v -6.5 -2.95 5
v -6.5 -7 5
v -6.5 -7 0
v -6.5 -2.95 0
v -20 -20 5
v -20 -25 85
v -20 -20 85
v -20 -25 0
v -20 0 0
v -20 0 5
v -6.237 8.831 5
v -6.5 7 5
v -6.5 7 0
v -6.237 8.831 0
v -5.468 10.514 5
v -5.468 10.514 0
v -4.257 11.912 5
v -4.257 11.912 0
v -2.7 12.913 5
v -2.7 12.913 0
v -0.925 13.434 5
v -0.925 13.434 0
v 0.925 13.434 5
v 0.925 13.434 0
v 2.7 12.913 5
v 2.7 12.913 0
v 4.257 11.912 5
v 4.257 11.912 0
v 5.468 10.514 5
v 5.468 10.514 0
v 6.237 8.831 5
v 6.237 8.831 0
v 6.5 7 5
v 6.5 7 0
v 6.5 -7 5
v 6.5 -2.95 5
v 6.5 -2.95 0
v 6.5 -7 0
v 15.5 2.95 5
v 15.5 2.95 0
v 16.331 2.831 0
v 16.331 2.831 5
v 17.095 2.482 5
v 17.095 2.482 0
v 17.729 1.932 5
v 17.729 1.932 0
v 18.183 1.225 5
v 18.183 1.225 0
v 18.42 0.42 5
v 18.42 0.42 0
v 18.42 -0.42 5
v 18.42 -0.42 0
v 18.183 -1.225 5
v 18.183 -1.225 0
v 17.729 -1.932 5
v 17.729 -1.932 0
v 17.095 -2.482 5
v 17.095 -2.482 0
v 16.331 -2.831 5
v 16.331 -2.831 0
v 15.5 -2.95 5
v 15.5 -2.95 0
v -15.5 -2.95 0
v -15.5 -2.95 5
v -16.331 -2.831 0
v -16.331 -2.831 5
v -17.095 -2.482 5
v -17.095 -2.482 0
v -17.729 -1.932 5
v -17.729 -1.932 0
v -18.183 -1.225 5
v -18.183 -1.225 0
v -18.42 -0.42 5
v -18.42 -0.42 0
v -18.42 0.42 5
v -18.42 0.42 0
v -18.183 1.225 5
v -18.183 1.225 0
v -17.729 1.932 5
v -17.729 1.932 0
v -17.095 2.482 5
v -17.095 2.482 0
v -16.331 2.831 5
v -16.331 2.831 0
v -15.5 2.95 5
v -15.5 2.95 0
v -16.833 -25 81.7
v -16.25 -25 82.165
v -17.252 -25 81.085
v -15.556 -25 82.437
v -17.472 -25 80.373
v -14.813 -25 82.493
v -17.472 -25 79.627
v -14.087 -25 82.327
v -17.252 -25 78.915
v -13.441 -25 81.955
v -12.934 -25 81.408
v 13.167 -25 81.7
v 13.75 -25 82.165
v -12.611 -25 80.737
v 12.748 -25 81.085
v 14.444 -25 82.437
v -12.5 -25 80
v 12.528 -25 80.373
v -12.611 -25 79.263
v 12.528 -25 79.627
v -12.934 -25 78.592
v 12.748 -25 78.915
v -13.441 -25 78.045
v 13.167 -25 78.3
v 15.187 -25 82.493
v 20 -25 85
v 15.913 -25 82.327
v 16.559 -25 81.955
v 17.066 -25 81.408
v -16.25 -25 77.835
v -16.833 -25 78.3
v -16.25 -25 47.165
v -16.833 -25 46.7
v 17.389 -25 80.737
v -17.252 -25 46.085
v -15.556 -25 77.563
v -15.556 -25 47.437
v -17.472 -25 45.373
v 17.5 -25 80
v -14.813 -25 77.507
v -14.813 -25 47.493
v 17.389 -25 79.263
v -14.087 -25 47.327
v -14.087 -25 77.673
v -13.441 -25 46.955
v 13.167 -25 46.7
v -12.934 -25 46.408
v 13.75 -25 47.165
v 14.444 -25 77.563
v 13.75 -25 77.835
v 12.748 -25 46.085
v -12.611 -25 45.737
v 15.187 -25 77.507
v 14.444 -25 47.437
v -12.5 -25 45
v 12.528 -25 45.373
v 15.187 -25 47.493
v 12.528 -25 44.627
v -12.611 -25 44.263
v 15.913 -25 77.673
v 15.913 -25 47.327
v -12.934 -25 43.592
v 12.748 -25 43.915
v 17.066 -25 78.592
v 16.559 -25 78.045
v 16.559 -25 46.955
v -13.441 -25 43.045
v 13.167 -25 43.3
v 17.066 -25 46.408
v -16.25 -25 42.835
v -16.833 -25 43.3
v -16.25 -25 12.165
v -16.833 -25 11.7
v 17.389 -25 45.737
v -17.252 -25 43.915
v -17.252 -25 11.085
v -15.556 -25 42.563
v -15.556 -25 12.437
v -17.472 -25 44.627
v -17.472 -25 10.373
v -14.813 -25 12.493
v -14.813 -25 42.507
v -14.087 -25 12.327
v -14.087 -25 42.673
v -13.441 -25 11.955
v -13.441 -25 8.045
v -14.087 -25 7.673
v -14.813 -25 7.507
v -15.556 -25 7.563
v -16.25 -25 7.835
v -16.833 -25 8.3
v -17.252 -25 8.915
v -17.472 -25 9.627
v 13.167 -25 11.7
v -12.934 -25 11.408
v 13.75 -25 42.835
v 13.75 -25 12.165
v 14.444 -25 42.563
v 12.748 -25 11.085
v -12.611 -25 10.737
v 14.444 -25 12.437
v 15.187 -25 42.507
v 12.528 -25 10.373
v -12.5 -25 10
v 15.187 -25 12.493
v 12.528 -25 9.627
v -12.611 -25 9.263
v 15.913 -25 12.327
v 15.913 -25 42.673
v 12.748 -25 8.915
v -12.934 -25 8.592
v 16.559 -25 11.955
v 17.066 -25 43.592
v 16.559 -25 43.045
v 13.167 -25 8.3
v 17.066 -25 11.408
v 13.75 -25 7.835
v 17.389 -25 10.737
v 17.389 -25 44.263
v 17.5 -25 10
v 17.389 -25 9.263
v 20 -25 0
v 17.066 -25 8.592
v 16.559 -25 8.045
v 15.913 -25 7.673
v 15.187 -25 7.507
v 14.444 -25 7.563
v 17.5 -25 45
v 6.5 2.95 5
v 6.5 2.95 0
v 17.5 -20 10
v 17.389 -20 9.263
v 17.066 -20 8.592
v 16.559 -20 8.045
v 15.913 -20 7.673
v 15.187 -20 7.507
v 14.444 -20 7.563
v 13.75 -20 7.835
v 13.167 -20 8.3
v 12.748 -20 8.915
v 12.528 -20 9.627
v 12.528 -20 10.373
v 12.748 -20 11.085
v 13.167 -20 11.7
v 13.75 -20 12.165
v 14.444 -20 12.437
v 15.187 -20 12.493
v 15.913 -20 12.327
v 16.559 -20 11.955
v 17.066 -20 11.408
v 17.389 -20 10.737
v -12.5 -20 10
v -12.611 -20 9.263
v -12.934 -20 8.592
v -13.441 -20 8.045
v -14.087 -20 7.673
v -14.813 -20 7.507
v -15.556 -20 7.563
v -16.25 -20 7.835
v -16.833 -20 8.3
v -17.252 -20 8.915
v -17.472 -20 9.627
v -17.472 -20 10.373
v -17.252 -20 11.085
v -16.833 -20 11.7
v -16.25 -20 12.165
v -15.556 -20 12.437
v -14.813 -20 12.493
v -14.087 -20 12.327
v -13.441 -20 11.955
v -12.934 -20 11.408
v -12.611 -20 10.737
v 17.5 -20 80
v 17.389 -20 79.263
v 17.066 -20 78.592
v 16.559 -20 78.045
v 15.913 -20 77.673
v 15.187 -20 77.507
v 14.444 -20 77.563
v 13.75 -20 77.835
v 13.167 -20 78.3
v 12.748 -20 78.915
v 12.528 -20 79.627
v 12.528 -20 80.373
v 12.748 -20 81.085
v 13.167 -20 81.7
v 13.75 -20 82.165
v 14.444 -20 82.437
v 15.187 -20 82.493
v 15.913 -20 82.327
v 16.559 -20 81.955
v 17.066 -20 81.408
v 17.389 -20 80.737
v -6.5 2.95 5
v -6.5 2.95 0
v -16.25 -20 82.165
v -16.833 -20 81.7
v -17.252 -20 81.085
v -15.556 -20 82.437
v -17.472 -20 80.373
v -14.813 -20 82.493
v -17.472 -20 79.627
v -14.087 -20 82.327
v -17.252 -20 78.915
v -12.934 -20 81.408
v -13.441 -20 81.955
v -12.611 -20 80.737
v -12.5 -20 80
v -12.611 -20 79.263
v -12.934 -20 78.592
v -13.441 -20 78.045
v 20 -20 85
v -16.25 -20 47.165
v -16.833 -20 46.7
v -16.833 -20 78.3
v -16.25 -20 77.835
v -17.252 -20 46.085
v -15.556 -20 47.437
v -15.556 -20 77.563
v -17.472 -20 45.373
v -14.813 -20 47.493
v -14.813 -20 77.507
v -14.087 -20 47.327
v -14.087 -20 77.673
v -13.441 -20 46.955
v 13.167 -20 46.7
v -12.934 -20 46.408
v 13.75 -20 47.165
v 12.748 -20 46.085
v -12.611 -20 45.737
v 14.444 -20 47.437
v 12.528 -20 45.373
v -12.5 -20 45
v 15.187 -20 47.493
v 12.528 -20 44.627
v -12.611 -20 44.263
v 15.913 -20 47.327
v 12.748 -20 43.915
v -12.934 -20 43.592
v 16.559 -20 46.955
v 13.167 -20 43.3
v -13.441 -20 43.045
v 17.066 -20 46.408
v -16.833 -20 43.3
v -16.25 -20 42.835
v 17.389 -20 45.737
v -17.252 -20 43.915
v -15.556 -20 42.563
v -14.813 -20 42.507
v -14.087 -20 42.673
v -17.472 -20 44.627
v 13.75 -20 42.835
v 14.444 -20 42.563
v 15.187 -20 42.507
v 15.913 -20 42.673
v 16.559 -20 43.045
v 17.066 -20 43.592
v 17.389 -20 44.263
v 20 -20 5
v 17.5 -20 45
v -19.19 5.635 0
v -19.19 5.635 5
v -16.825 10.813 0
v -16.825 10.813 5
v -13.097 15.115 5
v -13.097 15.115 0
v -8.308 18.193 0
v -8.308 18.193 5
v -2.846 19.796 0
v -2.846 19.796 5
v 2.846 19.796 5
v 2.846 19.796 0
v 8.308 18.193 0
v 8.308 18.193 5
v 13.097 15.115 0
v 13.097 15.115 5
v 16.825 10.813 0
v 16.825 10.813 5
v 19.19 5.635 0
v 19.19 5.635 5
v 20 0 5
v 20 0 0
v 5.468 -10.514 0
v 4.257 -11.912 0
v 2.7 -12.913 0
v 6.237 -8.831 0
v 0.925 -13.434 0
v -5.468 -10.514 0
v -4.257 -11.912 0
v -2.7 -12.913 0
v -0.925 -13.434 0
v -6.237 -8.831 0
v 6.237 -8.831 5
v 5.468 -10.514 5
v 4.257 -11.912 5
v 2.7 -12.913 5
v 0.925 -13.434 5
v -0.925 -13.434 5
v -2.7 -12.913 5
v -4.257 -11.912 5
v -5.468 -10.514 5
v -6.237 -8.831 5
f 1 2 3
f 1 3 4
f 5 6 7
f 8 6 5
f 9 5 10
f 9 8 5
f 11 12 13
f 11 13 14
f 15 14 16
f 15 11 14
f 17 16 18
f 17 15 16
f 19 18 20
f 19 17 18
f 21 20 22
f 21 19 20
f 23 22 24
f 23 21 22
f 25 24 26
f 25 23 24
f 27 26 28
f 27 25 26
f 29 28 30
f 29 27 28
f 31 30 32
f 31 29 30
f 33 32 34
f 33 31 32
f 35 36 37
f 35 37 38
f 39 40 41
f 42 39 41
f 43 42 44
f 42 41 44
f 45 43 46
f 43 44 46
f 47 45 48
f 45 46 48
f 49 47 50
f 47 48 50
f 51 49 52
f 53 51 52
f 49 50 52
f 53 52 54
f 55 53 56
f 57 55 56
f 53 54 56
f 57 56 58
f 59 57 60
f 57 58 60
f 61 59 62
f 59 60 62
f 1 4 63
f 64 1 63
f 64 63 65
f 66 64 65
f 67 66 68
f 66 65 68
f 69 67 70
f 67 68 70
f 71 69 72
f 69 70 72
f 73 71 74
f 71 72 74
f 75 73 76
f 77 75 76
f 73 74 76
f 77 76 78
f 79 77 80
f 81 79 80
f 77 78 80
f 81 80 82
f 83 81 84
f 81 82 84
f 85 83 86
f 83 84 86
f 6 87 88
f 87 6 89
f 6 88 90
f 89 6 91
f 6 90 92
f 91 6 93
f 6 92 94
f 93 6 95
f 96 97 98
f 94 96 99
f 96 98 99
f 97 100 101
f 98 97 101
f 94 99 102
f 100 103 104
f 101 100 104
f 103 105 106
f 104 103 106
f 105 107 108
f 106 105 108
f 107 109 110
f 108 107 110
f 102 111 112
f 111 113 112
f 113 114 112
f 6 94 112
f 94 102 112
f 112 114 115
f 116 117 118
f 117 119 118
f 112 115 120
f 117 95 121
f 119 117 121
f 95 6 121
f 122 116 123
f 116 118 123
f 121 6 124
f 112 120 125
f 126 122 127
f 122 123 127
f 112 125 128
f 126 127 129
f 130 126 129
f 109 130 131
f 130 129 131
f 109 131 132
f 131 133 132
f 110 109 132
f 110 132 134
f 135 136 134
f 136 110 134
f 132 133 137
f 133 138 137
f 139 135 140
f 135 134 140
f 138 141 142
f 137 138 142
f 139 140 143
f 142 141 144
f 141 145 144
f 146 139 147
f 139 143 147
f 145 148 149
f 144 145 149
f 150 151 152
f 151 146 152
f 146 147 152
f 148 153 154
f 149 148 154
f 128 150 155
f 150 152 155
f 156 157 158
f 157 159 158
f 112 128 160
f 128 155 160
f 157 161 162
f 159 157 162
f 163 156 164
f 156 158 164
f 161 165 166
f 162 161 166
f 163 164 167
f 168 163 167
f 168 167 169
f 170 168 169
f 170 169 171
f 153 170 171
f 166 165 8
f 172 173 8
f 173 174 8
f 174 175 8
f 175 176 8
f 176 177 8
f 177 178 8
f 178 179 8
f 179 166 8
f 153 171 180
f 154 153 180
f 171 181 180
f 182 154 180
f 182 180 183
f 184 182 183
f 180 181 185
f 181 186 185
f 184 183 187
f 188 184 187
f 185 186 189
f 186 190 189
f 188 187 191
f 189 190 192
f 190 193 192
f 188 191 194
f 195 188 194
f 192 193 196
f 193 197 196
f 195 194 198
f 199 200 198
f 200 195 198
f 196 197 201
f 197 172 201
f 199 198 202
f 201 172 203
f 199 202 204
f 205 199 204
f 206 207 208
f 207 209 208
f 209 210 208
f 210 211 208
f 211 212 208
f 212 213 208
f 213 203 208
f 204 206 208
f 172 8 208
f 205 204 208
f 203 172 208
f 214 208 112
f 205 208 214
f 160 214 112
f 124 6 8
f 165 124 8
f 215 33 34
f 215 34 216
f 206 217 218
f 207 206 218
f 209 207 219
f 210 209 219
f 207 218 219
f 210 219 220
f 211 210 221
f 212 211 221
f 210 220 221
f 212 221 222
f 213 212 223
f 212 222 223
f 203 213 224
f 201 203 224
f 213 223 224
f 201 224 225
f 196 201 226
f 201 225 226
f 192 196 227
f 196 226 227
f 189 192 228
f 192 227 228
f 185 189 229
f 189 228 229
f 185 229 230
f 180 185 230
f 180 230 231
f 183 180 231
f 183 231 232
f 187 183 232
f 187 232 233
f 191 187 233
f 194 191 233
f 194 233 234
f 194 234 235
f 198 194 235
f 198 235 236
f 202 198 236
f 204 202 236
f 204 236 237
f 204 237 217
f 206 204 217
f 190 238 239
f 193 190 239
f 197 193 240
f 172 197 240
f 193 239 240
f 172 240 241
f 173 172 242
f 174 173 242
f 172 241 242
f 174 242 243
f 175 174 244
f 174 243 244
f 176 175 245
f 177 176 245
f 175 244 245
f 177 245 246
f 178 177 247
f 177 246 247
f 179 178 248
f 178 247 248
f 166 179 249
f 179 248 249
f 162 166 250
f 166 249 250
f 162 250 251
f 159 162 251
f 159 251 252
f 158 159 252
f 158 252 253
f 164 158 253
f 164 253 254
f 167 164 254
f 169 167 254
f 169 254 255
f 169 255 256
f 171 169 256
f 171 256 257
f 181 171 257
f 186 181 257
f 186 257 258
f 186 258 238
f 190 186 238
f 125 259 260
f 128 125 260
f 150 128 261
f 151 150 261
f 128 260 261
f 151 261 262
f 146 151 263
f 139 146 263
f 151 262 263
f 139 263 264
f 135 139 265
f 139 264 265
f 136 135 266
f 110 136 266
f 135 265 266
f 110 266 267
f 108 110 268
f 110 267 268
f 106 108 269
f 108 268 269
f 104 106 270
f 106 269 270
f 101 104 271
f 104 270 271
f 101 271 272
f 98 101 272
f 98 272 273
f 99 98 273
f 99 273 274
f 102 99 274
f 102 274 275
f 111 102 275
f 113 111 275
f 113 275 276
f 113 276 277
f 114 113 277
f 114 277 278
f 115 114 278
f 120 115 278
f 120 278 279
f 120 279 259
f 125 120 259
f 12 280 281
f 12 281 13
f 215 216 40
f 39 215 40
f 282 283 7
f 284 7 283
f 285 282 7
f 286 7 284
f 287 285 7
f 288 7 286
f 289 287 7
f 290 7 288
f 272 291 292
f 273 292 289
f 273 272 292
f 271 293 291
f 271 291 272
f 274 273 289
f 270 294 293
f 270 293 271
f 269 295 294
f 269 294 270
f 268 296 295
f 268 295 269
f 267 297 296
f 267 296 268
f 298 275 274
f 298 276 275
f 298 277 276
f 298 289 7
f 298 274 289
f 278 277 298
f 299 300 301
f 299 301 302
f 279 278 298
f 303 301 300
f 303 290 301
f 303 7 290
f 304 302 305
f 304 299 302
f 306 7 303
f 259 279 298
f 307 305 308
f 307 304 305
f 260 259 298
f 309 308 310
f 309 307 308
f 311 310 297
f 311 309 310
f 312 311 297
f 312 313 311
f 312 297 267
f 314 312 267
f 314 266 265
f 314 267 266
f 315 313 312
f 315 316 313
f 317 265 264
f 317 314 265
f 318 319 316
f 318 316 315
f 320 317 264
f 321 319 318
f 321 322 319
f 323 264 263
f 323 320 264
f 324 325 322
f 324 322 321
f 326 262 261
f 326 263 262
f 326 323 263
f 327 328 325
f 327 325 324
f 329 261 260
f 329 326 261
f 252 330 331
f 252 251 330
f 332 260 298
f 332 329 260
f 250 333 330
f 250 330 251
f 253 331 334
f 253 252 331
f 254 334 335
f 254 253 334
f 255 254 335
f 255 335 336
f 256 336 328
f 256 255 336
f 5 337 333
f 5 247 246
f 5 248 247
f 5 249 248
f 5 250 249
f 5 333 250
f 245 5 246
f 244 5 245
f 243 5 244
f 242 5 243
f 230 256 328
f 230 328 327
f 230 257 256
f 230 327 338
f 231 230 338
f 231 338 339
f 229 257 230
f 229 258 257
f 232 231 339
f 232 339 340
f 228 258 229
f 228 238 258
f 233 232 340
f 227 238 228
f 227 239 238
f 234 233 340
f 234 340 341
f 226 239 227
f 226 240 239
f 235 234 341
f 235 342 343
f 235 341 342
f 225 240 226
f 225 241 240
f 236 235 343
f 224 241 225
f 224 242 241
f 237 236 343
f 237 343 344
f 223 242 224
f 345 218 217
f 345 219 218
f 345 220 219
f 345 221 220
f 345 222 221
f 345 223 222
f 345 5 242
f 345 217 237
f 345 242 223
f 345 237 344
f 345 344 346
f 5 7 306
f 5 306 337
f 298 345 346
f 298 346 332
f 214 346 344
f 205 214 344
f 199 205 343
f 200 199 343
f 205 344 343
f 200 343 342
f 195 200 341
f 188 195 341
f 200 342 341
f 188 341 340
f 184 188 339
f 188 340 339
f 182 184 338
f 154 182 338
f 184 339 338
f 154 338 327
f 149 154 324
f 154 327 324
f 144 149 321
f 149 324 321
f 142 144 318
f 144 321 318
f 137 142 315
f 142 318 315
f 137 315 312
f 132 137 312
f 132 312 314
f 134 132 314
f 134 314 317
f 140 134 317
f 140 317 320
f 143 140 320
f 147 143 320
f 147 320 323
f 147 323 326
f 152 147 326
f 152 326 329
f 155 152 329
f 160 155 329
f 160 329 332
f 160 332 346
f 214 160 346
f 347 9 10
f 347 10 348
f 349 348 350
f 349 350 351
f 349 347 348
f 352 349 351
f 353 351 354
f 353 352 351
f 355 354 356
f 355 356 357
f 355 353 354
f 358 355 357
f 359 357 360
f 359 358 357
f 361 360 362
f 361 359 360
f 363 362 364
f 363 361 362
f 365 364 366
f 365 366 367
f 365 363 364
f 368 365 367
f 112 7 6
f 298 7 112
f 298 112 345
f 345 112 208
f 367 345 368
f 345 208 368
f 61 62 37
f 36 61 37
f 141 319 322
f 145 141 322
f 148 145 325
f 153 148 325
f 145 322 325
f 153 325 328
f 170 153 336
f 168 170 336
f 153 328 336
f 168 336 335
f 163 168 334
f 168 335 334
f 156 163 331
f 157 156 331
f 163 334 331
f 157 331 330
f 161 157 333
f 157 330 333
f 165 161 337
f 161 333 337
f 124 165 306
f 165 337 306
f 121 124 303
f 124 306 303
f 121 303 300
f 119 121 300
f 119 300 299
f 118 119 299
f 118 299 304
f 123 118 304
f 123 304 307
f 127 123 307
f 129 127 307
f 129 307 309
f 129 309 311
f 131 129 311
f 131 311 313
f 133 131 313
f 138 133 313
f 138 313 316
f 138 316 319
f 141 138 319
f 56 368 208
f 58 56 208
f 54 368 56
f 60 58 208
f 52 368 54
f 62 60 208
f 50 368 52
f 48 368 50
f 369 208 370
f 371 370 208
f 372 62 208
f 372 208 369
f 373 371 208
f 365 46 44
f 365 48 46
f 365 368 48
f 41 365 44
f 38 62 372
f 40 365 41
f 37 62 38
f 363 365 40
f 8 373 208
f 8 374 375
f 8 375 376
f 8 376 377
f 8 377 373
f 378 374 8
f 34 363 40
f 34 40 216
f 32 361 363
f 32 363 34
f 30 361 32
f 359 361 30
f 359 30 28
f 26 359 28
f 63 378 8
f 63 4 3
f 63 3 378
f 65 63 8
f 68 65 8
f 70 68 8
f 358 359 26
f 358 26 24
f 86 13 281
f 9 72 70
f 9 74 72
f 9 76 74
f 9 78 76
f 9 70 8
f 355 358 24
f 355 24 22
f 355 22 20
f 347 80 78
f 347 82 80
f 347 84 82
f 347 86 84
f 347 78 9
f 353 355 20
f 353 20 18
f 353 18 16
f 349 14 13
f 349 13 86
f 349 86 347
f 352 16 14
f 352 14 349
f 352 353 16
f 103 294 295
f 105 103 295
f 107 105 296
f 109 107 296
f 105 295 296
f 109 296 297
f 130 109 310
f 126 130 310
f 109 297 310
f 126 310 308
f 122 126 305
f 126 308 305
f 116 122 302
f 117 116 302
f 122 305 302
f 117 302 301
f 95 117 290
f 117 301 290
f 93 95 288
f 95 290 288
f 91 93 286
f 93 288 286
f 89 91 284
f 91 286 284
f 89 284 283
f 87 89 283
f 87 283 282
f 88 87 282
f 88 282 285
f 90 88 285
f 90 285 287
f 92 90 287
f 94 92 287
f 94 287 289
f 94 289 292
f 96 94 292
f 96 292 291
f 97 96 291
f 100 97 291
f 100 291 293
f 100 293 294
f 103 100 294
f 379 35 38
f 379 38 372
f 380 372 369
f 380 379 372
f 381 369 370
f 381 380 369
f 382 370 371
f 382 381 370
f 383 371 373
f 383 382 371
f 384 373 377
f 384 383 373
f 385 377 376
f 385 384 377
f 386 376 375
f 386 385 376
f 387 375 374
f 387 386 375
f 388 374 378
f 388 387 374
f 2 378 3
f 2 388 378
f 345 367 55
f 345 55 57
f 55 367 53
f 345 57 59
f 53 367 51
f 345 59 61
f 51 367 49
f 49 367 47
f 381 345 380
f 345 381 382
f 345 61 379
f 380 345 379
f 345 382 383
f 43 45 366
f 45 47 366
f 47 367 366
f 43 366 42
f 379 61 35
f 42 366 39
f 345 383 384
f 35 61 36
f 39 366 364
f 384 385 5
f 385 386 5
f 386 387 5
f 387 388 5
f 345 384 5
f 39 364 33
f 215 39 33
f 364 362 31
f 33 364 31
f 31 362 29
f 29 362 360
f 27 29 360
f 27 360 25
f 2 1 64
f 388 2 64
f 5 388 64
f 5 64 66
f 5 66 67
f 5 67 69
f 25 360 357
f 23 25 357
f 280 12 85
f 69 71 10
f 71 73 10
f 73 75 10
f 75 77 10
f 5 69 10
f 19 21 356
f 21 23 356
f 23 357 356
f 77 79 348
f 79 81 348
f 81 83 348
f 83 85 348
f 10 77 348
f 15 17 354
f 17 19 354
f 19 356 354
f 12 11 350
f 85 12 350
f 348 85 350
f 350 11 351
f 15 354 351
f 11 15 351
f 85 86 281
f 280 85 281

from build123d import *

# Parameters (mm, degrees)
BOSS_EXTRUDE1_DEPTH = 5
SKETCH3_W           = 40
SKETCH3_H           = 5
BOSS_EXTRUDE2_DEPTH = 80
SKETCH4_R           = 2.5
CUT_EXTRUDE1_DEPTH  = 10
CUT_EXTRUDE2_DEPTH  = 10


with BuildPart() as part:
    # Sketch2 → Boss-Extrude1 (new body)
    with BuildSketch(Plane.XY):
        with BuildLine():
            Line((20, 0), (20, -25))
            Line((20, -25), (-20, -25))
            Line((-20, -25), (-20, 0))
            ThreePointArc((-20, 0), (0, 20), (20, 0))
        make_face()
        with BuildLine():
            Line((-15.5, 2.95), (15.5, 2.95))
            ThreePointArc((15.5, 2.95), (18.45, 0), (15.5, -2.95))
            Line((15.5, -2.95), (-15.5, -2.95))
            ThreePointArc((-15.5, -2.95), (-18.45, 0), (-15.5, 2.95))
        make_face(mode=Mode.SUBTRACT)
    extrude(amount=BOSS_EXTRUDE1_DEPTH)

    # Sketch3 → Boss-Extrude2 (add)
    with BuildSketch(Plane.XY.offset(5)):
        with Locations((0, -22.5)):
            Rectangle(SKETCH3_W, SKETCH3_H)
    extrude(amount=BOSS_EXTRUDE2_DEPTH)

    # Sketch4 → Cut-Extrude1 (cut)
    with BuildSketch(Plane(origin=(0, -20, 0), x_dir=(1, 0, 0), z_dir=(0, 1, 0))):
        with Locations((-15, -10)):
            Circle(SKETCH4_R)
        with Locations((15, -10)):
            Circle(SKETCH4_R)
        with Locations((15, -80)):
            Circle(SKETCH4_R)
        with Locations((-15, -80)):
            Circle(SKETCH4_R)
        with Locations((-15, -45)):
            Circle(SKETCH4_R)
        with Locations((15, -45)):
            Circle(SKETCH4_R)
    extrude(amount=-CUT_EXTRUDE1_DEPTH, mode=Mode.SUBTRACT)

    # Sketch5 → Cut-Extrude2 (cut)
    with BuildSketch(Plane.XY.offset(5)):
        with BuildLine():
            Line((6.5, 7), (6.5, -7))
            ThreePointArc((6.5, -7), (0, -13.5), (-6.5, -7))
            Line((-6.5, -7), (-6.5, 7))
            ThreePointArc((-6.5, 7), (0, 13.5), (6.5, 7))
        make_face()
    extrude(amount=-CUT_EXTRUDE2_DEPTH, mode=Mode.SUBTRACT)


solid = part.part
